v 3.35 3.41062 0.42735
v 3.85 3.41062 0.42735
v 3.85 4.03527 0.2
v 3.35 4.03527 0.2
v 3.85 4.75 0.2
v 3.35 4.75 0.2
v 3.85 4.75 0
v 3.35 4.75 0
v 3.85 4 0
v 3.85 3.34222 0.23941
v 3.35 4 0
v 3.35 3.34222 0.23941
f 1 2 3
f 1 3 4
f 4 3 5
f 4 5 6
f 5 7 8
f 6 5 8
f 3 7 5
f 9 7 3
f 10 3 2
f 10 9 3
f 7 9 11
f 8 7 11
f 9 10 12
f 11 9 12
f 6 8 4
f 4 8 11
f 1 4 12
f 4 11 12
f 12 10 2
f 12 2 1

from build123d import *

# Parameters (mm, degrees)
BOX007_W                  = 0.5
BOX007_H                  = 0.75
BOX007_DEPTH              = 0.2
BOX008_W                  = 0.5
BOX008_H                  = 0.7
BOX008_DEPTH              = 0.2
BOX008_PLACEMENT_ANGLE    = 20
FUSION003_PLACEMENT_ANGLE = 180


with BuildPart() as cube007:
    # Box007 → Box007 (new body)
    with BuildSketch(Plane(origin=(0, -1.25, 0), x_dir=(1, 0, 0), z_dir=(0, 0, 1))):
        with Locations((0.25, 0.375)):
            Rectangle(BOX007_W, BOX007_H)
    extrude(amount=BOX007_DEPTH)


with BuildPart() as fusion003:
    # Box008 → Box008 (new body)
    with BuildSketch(Plane.XY):
        with Locations((0.25, 0.35)):
            Rectangle(BOX008_W, BOX008_H)
    extrude(amount=BOX008_DEPTH)


with BuildPart() as fusion003_1:
    # Box008 placement: moved
    add(fusion003.part.moved(Location((0, -0.5, 0))).rotate(Axis((0, -0.5, 0), (1, 0, 0)), BOX008_PLACEMENT_ANGLE))

    # Fusion003: union Cube007
    add(cube007.part)


with BuildPart() as fusion003_2:
    # Fusion003 placement: moved
    add(fusion003_1.part.moved(Location((3.85, 3.5, 0))).rotate(Axis((3.85, 3.5, 0), (0, 0, 1)), FUSION003_PLACEMENT_ANGLE))


solid = fusion003_2.part
